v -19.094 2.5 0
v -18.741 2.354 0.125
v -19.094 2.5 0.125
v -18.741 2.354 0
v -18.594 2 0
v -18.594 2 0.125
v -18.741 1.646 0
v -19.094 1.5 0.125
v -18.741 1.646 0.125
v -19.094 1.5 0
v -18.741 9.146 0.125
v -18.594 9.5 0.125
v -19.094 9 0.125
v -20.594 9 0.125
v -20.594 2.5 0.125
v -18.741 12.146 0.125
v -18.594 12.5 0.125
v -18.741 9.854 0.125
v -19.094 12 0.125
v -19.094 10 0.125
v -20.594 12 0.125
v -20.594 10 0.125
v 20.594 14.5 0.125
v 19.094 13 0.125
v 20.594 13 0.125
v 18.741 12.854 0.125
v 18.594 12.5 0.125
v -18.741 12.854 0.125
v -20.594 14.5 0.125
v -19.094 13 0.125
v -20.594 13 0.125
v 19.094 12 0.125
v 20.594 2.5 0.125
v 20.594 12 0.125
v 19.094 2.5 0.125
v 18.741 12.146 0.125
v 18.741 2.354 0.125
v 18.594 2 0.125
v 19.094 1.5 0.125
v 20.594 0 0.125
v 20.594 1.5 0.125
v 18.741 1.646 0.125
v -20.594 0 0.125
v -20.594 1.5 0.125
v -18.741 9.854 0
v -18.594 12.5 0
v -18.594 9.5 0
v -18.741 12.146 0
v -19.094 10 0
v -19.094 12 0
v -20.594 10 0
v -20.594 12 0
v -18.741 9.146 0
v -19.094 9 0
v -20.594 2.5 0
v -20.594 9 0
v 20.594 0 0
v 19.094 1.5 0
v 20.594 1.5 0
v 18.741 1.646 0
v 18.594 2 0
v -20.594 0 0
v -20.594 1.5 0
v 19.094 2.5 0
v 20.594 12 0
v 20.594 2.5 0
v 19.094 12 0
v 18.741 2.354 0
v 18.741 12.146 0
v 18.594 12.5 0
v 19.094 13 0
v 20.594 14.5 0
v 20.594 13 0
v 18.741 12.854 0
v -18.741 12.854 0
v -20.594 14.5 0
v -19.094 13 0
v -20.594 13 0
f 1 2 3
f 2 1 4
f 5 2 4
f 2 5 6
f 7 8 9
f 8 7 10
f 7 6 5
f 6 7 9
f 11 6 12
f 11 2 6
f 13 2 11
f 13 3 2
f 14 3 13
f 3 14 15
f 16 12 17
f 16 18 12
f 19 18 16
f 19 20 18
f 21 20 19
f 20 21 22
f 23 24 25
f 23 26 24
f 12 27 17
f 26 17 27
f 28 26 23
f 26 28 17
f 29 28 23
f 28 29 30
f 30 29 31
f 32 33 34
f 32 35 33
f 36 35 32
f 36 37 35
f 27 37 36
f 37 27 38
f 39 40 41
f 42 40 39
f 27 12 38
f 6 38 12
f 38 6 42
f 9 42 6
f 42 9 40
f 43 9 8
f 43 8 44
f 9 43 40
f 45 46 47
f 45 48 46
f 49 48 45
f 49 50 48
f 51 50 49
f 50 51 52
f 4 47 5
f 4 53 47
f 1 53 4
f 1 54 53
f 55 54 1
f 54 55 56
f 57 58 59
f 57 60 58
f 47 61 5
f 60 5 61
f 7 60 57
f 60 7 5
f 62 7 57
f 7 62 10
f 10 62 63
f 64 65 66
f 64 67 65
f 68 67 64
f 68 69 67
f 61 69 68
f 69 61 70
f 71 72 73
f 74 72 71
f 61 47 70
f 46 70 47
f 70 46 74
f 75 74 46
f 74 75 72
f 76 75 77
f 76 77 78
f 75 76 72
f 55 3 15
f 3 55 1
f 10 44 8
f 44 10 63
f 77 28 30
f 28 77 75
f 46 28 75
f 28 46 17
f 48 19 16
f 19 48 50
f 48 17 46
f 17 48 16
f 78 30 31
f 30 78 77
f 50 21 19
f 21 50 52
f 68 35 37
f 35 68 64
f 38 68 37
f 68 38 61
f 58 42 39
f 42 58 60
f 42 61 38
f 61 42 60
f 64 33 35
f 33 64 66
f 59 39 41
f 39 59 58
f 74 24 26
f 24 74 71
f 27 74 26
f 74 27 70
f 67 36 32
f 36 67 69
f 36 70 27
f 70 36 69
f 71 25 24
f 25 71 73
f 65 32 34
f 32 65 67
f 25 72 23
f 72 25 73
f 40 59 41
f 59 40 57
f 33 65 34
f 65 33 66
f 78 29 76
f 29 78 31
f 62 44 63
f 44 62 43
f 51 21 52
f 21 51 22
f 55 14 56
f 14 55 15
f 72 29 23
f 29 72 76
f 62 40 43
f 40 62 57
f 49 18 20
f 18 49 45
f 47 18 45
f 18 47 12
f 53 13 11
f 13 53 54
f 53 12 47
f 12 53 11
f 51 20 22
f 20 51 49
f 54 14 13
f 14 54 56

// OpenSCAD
// file: modus.scad
//Corner Joint - allows the sides of two parts to create inlayed corner. Aids with welding.
//need to verify module math is the same throughout all parts.

module cornerjoint(Z,L,H,EndGap,PadL,PadH,CJangle,CJcenter){
    //change so that H = Z of inlayed part (usually 0.5)
    //add center and angle in degrees option, orgin far side of cut out area

     if((CJangle==0)&&(CJcenter==0))
      {    
        translate([0,0,0])
        rotate([0,0,CJangle])
        difference(){
        cube([L,H+PadH,Z]);
        translate([EndGap,H,0])
        cube([PadL,PadH,Z]);
        translate([L-EndGap-PadL,H,0])
        cube([PadL,PadH,Z]);}
      }    
else if((CJangle==90)&&(CJcenter==0))
      {    
        translate([H+PadH,0,0])
        rotate([0,0,CJangle])
        difference(){
        cube([L,H+PadH,Z]);
        translate([EndGap,H,0])
        cube([PadL,PadH,Z]);
        translate([L-EndGap-PadL,H,0])
        cube([PadL,PadH,Z]);}
      }
else if((CJangle==180)&&(CJcenter==0))       
      {    
        translate([L,H+PadH,0])
        rotate([0,0,CJangle])
        difference(){
        cube([L,H+PadH,Z]);
        translate([EndGap,H,0])
        cube([PadL,PadH,Z]);
        translate([L-EndGap-PadL,H,0])
        cube([PadL,PadH,Z]);}
      }
else if((CJangle==270)&&(CJcenter==0))
      {    
        translate([0,L,0])
        rotate([0,0,CJangle])
        difference(){
        cube([L,H+PadH,Z]);
        translate([EndGap,H,0])
        cube([PadL,PadH,Z]);
        translate([L-EndGap-PadL,H,0])
        cube([PadL,PadH,Z]);}
      }  
      
//centered     
   
else if((CJangle==0)&&(CJcenter==1))
      {    
        translate([-L/2,0,0])
        rotate([0,0,CJangle])
        difference(){
        cube([L,H+PadH,Z]);
        translate([EndGap,H,0])
        cube([PadL,PadH,Z]);
        translate([L-EndGap-PadL,H,0])
        cube([PadL,PadH,Z]);}
      }  
else if((CJangle==90)&&(CJcenter==1))
      {    
        translate([0,-L/2,0])
        rotate([0,0,CJangle])
        difference(){
        cube([L,H+PadH,Z]);
        translate([EndGap,H,0])
        cube([PadL,PadH,Z]);
        translate([L-EndGap-PadL,H,0])
        cube([PadL,PadH,Z]);}
      }
else if((CJangle==180)&&(CJcenter==1))       
      {    
        translate([L/2,0,0])
        rotate([0,0,CJangle])
        difference(){
        cube([L,H+PadH,Z]);
        translate([EndGap,H,0])
        cube([PadL,PadH,Z]);
        translate([L-EndGap-PadL,H,0])
        cube([PadL,PadH,Z]);}
      }
else if((CJangle==270)&&(CJcenter==1))
      {    
        translate([0,L/2,0])
        rotate([0,0,CJangle])
        difference(){
        cube([L,H+PadH,Z]);
        translate([EndGap,H,0])
        cube([PadL,PadH,Z]);
        translate([L-EndGap-PadL,H,0])
        cube([PadL,PadH,Z]);}
      }
} //end cornerjoint module

//Tab Insert - used to cut a hole for an abutting part to insert into. Typically aids with welding the two parts.
module tabinsert(X,Y,Z,dGap,cGap,c1,c2,c3,c4,c5,c6,c7,c8,center){
    translate([-dGap-(center*(X/2)),-dGap-(center*(Y/2)),0]){
        //main cut
        cube([X+(dGap*2),Y+(dGap*2),Z]);
        //corner c1c2
        translate([-cGap,(Y+(dGap*2))-c1+cGap,0])
            {
        cube([c2,c1,Z]);}
       //corner c3c4
       translate([(X+(dGap*2))-c3+cGap,(Y+(dGap*2))-c4+cGap,0]){
           cube([c3,c4,Z]);
       }
       //corner c5c6
       translate([(X+(dGap*2))-c6+cGap,-cGap,0])
      {
          cube([c6,c5,Z]);
      }
       
       //corner c7c8 
       translate([-cGap,-cGap,0]){
           cube([c7,c8,Z]);
       }
    
    } //end center translate
} //end tabinsert module
 

module nut(flattoflat,nutheight){  //distance from one flat side to the other flat side "A/F"

//typical sizes found here:
//https://en.wikipedia.org/wiki/Nut_(hardware)

difference(){
    translate([0,0,nutheight/2])
cube(size = [10,10,nutheight], center = true);
    
for(i=[1:6]){
    rotate([0,0,i*60])
difference(){
    translate([-10,0,0])
    cube([20,20,nutheight]);
    translate([-10,0,0])
    cube([20,flattoflat/2,nutheight]);
}  //end difference
}  //end for
}  //end differeence
}  //end module
// file: vars.scad
brickW=6; 
brickL=24;
brickCH=6; //Is brick height being shortened by d1z??

//3.625 x 2.25 x 8
//6 x 12 x 6

grateX=56;
grateY=23;
grateH=37; //Height mounted above press's frame
grateA=17.5; //angle of grate

//grateX=56;
//grateY=23;
//grateH=37; //Height mounted above press's frame
//grateA=17.5; //angle of grate


$fn=8; //defines resolution of circles. 8 is okay for review. 100  or greater should be used for for final dxf export.

dZstandard=0.5; //thickness of steel to be cut for drawer parts
fZstandard=0.5;
aZstandard=0.5; //thickness of steel to be cut for arm parts
hZstandard=0.125;

fBOLTHOLEstandardD=1; //standard bolts used on frame
aBOLTHOLEstandardD=1;

sliderodholeOD=1.2; 
d1bushingOD=1.25;
d1bushingL=1.25;
d1shaftOD=1;
d1bolt1OD=1;
d1bolt2OD=0.75;
d1nut2AF=1.25;
d1nut2H=0.665;


dGap=0.03125; //gap between a hole cut's edge and the part sitting within the hole. //D3 appears to use 0.3125, is this in error?

//all parts set to standard thickness below
//off standard preferences can be defined below

//drawer
drawergap=0.0283;  //extra room for drawer to slide in the space between f1 and f4
drawerHgap=0.1884;  //total extra space from drawer sides to frame walls. sum of both sides.

d2clevispinaccessholeOD=3;

d1z=dZstandard;
d2z=dZstandard;
d3z=dZstandard;
d4z=dZstandard;
d5z=dZstandard;
d6z=dZstandard;
d5z=dZstandard;
d7z=dZstandard;
d8z=dZstandard;
d9z=dZstandard;

d11z=dZstandard;
d12z=dZstandard;


//frame

f1y=6;
f1z=fZstandard;


f2y=3.5;
f2z=fZstandard;

f3y=3.5;
f3z=fZstandard;

f4y=11;
f4z=fZstandard;

f5y=3.5;
f5z=fZstandard;

f6y=8;
f6z=fZstandard;

f8y=brickW;
f8z=fZstandard;
f8boltD=1;

f9y=4.5;

f9z=fZstandard;




f12z=fZstandard;   

f11x=1.25;
f11z=fZstandard;

f13z=fZstandard;

f14y=3.5;
f14z=fZstandard;

//arms

a1x=4;
a1z=aZstandard;
a1out=24; //length from frame to A5 edge for bricks to sit on as they exit

a2x=6;
a2z=aZstandard;

a3x=4;
a3y=72;
a3z=aZstandard;

a4x=6;
a4y=72;
a4z=aZstandard;

a5x=6;
a5y=72;
a5z=aZstandard;

a6z=aZstandard;

//guards

h1x=grateX;
h1y=grateH;  //might need to tweak for grate thickness

h1z=hZstandard;
h2z=hZstandard;
h3z=hZstandard;
h4z=hZstandard;
h5z=hZstandard;
h6z=hZstandard;
h7z=hZstandard;
h8z=hZstandard;

//
//Input your main cylinder's dimenions here
//
cylMainBore = 5;
cylMainStroke = 16;
cylMainExt = 43;
cylMainRet = 27;
cylMainA = (cylMainRet-cylMainStroke); //center to center minus stroke length
cylMainB = 0.25; // cylinder wall thickness
cylMainD = 2.5; //Rod OD
cylMainE = 5.75; //rear pin holder width
cylMainG = 4; //rod pin holder width
cylMainJ = 3.8; //distance from the end of the cylinder body to rod pin center
cylMainR = 1.52; //pin hole ID
cylMainS = 2.5; //pin holder OD

//
//Input your drawer cylinder's dimenions here
//
//
cylDrawerBore = 5;
cylDrawerStroke = 16;
cylDrawerExt = 43;
cylDrawerRet = 27;
cylDrawerA = (cylMainRet-cylMainStroke); //center to center minus stroke length
cylDrawerB = 0.25; // cylinder wall thickness
cylDrawerD = 2.5; //Rod OD
cylDrawerE = 5.75; //rear pin holder width
cylDrawerG = 4; //rod pin holder width
cylDrawerJ = 3.8; //distance from the end of the cylinder body to rod pin center
cylDrawerR = 1.52; //pin hole ID
cylDrawerS = 2.5; //pin holder OD

cylinderDRAWERbodyH=3; //measured when in position, largest length from top to bottom of cylinder
cylinderDRAWERminC2C=0; //drawer's hydraulic cylinder's distance from the center of one mounting hole to the center of the other when fully compressed.
cylinderDRAWERmaxC2C=0; ///drawer's hydraulic cylinder's distance from the center of one mounting hole to the center of the other when fully extended.
cylinderDRAWERrodclevisW=2.5; //width of cylinders' clevis on end of rod
cylinderDRAWERrodclevisID=1;
cylinderDRAWERrodclevisOD=2;
cylinderDRAWERrearclevisW=2.5; //width of mounting clevis cylinder body
cylinderDRAWERrearclevisID=1;
cylinderDRAWERrearclevisOD=2;
cylinderDRAWERrearclevisClearance=3; //usable space around rear clevis pin (in diameter). be aware of hyraulic fittings.

//the following variables are calculated in order of dependence on preceding variables

d3x=brickL+(d2z*2);
d3y=brickCH-d1z;
d4x=brickW+d3z+d3z;
d4y=brickCH-d1z;
d5x=brickL+(d2z*2);
d5y=brickW;
d6x=brickL+(d2z*2);
d6y=brickCH;
d7x=cylinderDRAWERrearclevisClearance;
d7y=a4z+d8z+cylinderDRAWERbodyH;
d9x=cylinderDRAWERbodyH+d6z; //should be based on clevis size?
d9y=cylinderDRAWERbodyH+d8z;
d8x=brickL+(d2z*2);
d8y=max(5,(d9x-d6z));   //need to review fundamentals, 5 minimun unless d9 gets larger than d8
d11x=1.5+(d1bolt1OD*2)+d1bushingOD;
d11y=max((0.5+d1bushingL),4);

d12x=d8x;
d12y=d11y+1;

f1x=((brickL+(d2z*2)+drawerHgap+(f9y*2)));
f3x=f1x;

d1x=(brickL+d2z+d2z);
//d1x=(((f1x/2)-(((brickL+(d2z*2)+drawerHgap)/2)-fZstandard-(sliderodholeOD/2)))+(d11x/2))*2;
d1y=((brickW+d3z+d3z)*3)+1;

d2x=d8y+d6z+brickW+d3z+d5y+d3z;
d2y=brickCH;



f11y=f8y;
f6x=brickL+(d2z*2)+(f9y*2)+drawerHgap;

f9x=(f2z+((cylMainS+0.125)/2)+cylMainRet-cylMainJ+1+f4y+drawergap+d2y+f1y);  //leaves 1" between top of cylinder and bottom of F4
f8x=f9x;


f2x=brickL+(d2z*2)+drawerHgap+(f9y*2)-(1.4*2);  //distance between large cut outs in f9

f5x=brickL+(d2z*2)+drawerHgap+(f9y*2)+(a1x*2); //distance between outer edges of each A1

f4x=f5x-0.5;   //same as f5 but minus 0.25 on each side to give a little overhang

f14x=brickL+(1*2)+(.125*2)+(dGap*2); 

f12x=f3x;
f12y=(f3y*2)+brickW;

sliderodoffset=(((brickL+(d2z*2)+drawerHgap)/2)-fZstandard-(sliderodholeOD/2));

distancetof8center=(cylDrawerExt+(a4x/2)+((d9x-d6z)/2)+d6z+(brickW/2)); //F8 center on A1

a1y=distancetof8center+(brickW/2)+a1out;
a2y=a1y;

h7x=f5x-((a1x/2)*2)+(1.5*2);
h7y=cylDrawerStroke;

h8x=f5x-((a1x/2)*2)+(1.5*2);
h8y=a1out-a5x-f5y;  //distance between a5 and f5

hopperBaseX=brickL;
hopperBaseY=brickW;

h2x=grateX;
h2y=sqrt(((h1y-(sin(grateA)*grateY))*(h1y-(sin(grateA)*grateY)))+(((cos(grateA)*grateY)-hopperBaseY)*((cos(grateA)*grateY)-hopperBaseY)));

//h1y-(sin(grateA)*grateY)
//(cos(grateA)*grateY)-hopperBaseY

echo(h1y-(sin(grateA)*grateY));
echo((cos(grateA)*grateY)-hopperBaseY);
echo(h2y);
echo(atan((h1y-(sin(grateA)*grateY))/((cos(grateA)*grateY)-hopperBaseY)));
echo((h1y-(sin(grateA)*grateY))/(h1y));

// ECHO - REQUIRED PARTS BASED ON INPUTS

echo(str("Minimum drawer cylinder stroke length: ",(d3z*2)+d5y+brickW));
//would be cool to validate and confirm user inputed stroke length. set error=1; if drawer cylinder is not long enough. print an echo warning.

echo(str("Grate hieght above ground level: ",(1)));
// main file
include <vars.scad>;
use <modus.scad>;

h8p();

module h8p(){
    
difference(){
    
translate([-(h8x/2),0,0])
cube([h8x,h8y,h8z]);
    
    translate([-(h8x/2)+1.5,h8y-5,0])
        cylinder(h = f6z, d = aBOLTHOLEstandardD);
    translate([-(h8x/2),h8y-5-(aBOLTHOLEstandardD/2),0])
        cube([1.5,aBOLTHOLEstandardD,h8z]);    
    
translate([-(h8x/2),0,0])
cuts();
translate([(h8x/2),0,0])
mirror([1,0,0])
cuts();
} //end difference

module cuts(){
    
    translate([1.5,2,0])
        cylinder(h = h8z, d = aBOLTHOLEstandardD);
    translate([0,2-(aBOLTHOLEstandardD/2),0])
        cube([1.5,aBOLTHOLEstandardD,h8z]);
    translate([1.5,h8y-2,0])
        cylinder(h = h8z, d = aBOLTHOLEstandardD);
    translate([0,h8y-2-(aBOLTHOLEstandardD/2),0])
        cube([1.5,aBOLTHOLEstandardD,h8z]);
    
} //end cuts module
} //end h8p module
